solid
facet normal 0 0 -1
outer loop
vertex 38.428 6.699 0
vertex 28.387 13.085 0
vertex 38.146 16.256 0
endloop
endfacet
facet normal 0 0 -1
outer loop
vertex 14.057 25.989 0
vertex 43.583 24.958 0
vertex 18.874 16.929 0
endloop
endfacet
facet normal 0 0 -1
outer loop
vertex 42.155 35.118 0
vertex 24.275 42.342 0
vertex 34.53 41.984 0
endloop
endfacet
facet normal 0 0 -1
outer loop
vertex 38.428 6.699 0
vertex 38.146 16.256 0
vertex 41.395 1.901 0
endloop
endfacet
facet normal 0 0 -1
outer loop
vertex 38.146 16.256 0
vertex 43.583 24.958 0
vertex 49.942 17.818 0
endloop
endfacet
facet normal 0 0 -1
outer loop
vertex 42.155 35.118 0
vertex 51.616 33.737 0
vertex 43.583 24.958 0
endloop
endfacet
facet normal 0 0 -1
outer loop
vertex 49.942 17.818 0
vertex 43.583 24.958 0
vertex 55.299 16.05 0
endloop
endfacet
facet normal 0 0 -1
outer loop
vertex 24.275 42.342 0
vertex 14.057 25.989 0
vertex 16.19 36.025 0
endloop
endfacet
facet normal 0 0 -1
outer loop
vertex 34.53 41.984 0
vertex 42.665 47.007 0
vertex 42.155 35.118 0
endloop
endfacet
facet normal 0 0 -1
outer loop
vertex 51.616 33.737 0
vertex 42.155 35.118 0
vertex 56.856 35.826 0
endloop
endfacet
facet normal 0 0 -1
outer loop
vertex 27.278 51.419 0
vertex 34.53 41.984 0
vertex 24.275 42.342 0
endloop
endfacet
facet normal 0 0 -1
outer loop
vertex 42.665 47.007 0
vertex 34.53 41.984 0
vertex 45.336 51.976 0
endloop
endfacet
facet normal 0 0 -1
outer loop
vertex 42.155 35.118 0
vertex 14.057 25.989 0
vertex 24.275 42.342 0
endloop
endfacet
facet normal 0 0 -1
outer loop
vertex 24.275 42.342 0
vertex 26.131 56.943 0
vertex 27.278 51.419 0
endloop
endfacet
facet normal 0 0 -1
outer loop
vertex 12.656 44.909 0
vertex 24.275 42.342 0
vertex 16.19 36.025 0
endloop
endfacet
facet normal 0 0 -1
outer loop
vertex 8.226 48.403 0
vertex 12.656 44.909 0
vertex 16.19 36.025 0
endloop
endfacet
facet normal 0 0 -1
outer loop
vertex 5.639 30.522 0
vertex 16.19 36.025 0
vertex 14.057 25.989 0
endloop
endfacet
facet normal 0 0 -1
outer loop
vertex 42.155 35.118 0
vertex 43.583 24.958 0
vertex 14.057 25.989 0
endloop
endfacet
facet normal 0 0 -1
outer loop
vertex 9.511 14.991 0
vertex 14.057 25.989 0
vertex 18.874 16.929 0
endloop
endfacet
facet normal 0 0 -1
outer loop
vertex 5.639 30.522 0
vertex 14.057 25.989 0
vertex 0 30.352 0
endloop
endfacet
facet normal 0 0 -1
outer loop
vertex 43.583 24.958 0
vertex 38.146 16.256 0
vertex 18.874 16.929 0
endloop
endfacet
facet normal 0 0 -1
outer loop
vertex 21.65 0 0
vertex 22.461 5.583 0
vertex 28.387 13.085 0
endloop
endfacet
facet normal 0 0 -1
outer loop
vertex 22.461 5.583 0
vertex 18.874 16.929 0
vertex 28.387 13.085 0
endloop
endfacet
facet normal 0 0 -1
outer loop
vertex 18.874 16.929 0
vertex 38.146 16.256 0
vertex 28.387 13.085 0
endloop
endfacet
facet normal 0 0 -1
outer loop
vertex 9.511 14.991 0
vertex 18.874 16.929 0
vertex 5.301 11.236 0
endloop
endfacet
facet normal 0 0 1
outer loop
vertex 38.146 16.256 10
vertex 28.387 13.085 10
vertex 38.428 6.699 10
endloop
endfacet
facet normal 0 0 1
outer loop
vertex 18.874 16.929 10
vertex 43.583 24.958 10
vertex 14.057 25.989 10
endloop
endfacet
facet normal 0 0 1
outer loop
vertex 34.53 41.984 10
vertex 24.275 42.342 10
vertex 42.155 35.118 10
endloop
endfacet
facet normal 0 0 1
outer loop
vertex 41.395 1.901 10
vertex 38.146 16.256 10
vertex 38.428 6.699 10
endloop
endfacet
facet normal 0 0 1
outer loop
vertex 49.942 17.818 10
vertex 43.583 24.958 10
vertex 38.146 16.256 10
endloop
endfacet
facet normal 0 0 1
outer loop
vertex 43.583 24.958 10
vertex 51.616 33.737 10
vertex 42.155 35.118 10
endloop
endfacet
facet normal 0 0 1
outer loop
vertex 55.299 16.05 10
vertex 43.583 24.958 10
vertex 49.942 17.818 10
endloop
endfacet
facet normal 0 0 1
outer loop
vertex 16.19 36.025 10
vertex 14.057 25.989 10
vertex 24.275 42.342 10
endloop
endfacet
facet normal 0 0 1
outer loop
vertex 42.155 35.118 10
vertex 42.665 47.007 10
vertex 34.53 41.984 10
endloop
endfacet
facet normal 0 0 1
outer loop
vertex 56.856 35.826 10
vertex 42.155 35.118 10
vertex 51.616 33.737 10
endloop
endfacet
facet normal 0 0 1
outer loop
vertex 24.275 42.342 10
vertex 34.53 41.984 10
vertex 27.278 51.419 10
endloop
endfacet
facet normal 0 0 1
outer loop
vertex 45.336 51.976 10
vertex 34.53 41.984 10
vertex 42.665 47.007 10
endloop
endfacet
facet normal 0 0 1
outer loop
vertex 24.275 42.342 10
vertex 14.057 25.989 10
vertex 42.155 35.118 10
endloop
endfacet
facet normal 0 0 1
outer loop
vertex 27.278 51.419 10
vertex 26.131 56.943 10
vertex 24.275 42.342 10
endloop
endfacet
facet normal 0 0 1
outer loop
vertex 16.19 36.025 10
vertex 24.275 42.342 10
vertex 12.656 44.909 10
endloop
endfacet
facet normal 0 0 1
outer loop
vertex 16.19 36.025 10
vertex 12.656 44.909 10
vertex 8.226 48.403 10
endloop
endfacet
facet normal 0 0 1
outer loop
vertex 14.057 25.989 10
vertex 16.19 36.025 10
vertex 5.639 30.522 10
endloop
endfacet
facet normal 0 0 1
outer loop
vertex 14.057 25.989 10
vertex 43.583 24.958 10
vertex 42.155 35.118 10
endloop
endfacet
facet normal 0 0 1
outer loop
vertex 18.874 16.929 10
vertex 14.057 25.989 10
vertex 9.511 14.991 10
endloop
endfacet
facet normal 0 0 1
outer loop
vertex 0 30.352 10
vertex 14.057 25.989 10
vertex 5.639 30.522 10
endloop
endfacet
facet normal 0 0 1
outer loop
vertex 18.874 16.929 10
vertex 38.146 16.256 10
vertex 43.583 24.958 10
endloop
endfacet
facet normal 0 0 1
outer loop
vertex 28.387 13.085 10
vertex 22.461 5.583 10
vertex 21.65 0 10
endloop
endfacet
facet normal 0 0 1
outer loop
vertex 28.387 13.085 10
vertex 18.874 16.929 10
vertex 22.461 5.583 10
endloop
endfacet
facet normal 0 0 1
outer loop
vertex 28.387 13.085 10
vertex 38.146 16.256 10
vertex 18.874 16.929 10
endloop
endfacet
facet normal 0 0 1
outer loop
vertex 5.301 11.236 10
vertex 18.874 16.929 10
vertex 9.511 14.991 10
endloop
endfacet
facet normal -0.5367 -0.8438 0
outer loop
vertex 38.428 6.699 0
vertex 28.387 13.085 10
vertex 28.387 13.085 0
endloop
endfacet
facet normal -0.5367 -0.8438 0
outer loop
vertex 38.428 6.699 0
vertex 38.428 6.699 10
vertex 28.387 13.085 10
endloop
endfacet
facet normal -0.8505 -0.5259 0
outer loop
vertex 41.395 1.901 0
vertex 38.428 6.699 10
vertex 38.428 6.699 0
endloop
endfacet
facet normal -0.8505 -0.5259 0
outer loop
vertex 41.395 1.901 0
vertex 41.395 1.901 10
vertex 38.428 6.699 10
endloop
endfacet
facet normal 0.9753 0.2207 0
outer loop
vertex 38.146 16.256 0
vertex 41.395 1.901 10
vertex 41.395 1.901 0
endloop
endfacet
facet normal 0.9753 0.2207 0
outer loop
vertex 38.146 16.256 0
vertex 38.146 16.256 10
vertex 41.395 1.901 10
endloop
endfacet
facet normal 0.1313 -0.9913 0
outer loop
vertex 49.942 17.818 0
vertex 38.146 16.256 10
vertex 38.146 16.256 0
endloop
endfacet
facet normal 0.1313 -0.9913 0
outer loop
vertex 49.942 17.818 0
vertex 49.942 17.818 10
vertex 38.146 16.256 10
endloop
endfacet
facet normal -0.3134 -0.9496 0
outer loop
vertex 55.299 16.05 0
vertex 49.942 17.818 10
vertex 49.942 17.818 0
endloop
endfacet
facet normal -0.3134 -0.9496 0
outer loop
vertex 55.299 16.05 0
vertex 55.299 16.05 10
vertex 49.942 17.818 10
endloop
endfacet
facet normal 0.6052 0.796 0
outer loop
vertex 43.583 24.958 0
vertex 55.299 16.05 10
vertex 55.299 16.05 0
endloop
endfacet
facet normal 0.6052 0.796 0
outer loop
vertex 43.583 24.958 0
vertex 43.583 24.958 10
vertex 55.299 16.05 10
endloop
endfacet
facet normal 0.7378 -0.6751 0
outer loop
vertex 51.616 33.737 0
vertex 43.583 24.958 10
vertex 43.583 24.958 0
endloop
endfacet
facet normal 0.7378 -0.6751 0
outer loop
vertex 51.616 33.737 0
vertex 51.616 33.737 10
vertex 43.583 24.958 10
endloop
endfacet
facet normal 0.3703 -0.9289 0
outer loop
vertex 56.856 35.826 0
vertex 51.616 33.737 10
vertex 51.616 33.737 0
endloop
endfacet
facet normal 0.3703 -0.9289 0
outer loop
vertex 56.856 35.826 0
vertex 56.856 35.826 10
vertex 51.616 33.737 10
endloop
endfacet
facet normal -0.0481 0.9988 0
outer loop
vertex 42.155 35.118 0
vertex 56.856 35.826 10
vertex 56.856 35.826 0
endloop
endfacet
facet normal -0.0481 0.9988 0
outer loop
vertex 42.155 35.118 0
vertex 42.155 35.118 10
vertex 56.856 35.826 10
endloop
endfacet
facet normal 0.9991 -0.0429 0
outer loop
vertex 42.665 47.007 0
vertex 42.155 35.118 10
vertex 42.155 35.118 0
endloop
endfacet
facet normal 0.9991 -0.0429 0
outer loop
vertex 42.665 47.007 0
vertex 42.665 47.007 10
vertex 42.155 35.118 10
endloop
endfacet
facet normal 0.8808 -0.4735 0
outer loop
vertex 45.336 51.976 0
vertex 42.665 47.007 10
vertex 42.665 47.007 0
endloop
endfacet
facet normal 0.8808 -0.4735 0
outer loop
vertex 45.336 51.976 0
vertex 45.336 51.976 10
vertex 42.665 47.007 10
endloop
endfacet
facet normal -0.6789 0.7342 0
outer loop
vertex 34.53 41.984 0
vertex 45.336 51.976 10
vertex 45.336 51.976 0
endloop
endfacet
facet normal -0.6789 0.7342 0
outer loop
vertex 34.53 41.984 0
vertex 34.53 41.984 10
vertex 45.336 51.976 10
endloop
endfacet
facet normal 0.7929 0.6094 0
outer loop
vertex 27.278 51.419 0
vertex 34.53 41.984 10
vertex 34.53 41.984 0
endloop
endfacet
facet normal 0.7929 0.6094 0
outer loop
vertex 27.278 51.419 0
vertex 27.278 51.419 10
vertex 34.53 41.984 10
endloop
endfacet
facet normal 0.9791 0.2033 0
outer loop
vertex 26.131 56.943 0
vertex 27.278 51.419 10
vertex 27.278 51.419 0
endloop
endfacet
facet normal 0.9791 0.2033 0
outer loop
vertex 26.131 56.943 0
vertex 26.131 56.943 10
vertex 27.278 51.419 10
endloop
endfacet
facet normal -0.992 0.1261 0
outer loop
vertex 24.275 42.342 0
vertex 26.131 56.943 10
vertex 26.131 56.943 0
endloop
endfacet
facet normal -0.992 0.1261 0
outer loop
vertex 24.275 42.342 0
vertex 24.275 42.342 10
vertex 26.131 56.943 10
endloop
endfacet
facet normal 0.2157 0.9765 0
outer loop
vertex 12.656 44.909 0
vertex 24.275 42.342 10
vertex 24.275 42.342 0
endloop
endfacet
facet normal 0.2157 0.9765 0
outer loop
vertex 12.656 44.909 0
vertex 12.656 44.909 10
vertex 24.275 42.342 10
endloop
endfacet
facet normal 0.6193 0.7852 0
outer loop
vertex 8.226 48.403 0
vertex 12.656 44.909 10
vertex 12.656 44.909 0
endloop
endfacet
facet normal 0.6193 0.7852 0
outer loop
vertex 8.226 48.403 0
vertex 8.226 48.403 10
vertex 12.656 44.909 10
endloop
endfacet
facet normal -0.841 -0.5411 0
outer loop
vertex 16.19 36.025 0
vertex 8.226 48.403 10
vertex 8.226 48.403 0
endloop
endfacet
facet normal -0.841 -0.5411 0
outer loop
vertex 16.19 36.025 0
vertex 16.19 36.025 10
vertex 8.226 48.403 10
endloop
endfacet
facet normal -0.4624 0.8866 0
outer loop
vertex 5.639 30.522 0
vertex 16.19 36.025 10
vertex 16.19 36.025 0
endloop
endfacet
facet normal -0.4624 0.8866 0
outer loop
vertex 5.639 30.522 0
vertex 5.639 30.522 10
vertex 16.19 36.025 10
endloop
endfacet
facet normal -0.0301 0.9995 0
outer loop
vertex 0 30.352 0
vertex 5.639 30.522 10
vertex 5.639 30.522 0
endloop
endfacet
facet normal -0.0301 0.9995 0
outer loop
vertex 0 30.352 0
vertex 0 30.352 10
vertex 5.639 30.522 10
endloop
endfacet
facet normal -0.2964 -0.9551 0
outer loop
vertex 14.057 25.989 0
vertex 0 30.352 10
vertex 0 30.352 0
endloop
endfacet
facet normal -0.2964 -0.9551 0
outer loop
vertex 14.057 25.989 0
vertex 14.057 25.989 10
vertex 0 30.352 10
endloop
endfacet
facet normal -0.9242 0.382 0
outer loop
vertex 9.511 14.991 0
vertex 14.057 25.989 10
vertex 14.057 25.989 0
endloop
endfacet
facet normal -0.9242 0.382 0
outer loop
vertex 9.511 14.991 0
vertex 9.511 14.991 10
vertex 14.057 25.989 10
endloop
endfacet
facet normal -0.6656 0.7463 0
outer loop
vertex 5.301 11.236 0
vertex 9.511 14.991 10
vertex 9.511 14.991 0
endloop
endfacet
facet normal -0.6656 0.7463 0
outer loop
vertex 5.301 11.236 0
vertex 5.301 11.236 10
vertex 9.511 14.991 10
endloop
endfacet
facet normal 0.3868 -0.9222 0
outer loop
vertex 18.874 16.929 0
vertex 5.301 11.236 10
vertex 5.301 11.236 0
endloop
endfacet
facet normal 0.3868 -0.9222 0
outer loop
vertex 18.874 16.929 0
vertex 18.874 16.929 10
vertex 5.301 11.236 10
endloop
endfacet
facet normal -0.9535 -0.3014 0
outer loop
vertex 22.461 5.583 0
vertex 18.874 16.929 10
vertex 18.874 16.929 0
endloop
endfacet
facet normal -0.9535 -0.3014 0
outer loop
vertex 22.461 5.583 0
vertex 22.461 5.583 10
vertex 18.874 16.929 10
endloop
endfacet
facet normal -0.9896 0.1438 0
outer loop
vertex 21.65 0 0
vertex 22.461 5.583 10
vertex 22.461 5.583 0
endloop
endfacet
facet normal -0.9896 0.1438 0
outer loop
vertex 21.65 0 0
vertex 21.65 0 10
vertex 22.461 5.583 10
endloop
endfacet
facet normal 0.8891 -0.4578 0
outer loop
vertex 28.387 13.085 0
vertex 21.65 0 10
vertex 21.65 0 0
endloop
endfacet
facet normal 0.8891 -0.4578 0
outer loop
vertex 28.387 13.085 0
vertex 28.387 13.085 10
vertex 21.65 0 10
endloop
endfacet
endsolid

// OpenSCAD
$fn = 32;

// ----------------------------------------------------------------------
// Fan rotor section: 9 blades, 15 mm hub radius, 14 mm blades
// ----------------------------------------------------------------------

// --- parameters (mm) ---
profile_height = 10;      // extrusion height
profile_points = 27;      // points of the closed outline

profile = [[43.583, 24.958], [51.616, 33.737], [56.856, 35.826], [42.155, 35.118], [42.665, 47.007], [45.336, 51.976], [34.53, 41.984], [27.278, 51.419], [26.131, 56.943], [24.275, 42.342], [12.656, 44.909], [8.226, 48.403], [16.19, 36.025], [5.639, 30.522], [0, 30.352], [14.057, 25.989], [9.511, 14.991], [5.301, 11.236], [18.874, 16.929], [22.461, 5.583], [21.65, 0], [28.387, 13.085], [38.428, 6.699], [41.395, 1.901], [38.146, 16.256], [49.942, 17.818], [55.299, 16.05]];  // single closed polygon, 27 points, counter clockwise

// --- the one profile operation ---
linear_extrude(height = profile_height) polygon(points = profile);
